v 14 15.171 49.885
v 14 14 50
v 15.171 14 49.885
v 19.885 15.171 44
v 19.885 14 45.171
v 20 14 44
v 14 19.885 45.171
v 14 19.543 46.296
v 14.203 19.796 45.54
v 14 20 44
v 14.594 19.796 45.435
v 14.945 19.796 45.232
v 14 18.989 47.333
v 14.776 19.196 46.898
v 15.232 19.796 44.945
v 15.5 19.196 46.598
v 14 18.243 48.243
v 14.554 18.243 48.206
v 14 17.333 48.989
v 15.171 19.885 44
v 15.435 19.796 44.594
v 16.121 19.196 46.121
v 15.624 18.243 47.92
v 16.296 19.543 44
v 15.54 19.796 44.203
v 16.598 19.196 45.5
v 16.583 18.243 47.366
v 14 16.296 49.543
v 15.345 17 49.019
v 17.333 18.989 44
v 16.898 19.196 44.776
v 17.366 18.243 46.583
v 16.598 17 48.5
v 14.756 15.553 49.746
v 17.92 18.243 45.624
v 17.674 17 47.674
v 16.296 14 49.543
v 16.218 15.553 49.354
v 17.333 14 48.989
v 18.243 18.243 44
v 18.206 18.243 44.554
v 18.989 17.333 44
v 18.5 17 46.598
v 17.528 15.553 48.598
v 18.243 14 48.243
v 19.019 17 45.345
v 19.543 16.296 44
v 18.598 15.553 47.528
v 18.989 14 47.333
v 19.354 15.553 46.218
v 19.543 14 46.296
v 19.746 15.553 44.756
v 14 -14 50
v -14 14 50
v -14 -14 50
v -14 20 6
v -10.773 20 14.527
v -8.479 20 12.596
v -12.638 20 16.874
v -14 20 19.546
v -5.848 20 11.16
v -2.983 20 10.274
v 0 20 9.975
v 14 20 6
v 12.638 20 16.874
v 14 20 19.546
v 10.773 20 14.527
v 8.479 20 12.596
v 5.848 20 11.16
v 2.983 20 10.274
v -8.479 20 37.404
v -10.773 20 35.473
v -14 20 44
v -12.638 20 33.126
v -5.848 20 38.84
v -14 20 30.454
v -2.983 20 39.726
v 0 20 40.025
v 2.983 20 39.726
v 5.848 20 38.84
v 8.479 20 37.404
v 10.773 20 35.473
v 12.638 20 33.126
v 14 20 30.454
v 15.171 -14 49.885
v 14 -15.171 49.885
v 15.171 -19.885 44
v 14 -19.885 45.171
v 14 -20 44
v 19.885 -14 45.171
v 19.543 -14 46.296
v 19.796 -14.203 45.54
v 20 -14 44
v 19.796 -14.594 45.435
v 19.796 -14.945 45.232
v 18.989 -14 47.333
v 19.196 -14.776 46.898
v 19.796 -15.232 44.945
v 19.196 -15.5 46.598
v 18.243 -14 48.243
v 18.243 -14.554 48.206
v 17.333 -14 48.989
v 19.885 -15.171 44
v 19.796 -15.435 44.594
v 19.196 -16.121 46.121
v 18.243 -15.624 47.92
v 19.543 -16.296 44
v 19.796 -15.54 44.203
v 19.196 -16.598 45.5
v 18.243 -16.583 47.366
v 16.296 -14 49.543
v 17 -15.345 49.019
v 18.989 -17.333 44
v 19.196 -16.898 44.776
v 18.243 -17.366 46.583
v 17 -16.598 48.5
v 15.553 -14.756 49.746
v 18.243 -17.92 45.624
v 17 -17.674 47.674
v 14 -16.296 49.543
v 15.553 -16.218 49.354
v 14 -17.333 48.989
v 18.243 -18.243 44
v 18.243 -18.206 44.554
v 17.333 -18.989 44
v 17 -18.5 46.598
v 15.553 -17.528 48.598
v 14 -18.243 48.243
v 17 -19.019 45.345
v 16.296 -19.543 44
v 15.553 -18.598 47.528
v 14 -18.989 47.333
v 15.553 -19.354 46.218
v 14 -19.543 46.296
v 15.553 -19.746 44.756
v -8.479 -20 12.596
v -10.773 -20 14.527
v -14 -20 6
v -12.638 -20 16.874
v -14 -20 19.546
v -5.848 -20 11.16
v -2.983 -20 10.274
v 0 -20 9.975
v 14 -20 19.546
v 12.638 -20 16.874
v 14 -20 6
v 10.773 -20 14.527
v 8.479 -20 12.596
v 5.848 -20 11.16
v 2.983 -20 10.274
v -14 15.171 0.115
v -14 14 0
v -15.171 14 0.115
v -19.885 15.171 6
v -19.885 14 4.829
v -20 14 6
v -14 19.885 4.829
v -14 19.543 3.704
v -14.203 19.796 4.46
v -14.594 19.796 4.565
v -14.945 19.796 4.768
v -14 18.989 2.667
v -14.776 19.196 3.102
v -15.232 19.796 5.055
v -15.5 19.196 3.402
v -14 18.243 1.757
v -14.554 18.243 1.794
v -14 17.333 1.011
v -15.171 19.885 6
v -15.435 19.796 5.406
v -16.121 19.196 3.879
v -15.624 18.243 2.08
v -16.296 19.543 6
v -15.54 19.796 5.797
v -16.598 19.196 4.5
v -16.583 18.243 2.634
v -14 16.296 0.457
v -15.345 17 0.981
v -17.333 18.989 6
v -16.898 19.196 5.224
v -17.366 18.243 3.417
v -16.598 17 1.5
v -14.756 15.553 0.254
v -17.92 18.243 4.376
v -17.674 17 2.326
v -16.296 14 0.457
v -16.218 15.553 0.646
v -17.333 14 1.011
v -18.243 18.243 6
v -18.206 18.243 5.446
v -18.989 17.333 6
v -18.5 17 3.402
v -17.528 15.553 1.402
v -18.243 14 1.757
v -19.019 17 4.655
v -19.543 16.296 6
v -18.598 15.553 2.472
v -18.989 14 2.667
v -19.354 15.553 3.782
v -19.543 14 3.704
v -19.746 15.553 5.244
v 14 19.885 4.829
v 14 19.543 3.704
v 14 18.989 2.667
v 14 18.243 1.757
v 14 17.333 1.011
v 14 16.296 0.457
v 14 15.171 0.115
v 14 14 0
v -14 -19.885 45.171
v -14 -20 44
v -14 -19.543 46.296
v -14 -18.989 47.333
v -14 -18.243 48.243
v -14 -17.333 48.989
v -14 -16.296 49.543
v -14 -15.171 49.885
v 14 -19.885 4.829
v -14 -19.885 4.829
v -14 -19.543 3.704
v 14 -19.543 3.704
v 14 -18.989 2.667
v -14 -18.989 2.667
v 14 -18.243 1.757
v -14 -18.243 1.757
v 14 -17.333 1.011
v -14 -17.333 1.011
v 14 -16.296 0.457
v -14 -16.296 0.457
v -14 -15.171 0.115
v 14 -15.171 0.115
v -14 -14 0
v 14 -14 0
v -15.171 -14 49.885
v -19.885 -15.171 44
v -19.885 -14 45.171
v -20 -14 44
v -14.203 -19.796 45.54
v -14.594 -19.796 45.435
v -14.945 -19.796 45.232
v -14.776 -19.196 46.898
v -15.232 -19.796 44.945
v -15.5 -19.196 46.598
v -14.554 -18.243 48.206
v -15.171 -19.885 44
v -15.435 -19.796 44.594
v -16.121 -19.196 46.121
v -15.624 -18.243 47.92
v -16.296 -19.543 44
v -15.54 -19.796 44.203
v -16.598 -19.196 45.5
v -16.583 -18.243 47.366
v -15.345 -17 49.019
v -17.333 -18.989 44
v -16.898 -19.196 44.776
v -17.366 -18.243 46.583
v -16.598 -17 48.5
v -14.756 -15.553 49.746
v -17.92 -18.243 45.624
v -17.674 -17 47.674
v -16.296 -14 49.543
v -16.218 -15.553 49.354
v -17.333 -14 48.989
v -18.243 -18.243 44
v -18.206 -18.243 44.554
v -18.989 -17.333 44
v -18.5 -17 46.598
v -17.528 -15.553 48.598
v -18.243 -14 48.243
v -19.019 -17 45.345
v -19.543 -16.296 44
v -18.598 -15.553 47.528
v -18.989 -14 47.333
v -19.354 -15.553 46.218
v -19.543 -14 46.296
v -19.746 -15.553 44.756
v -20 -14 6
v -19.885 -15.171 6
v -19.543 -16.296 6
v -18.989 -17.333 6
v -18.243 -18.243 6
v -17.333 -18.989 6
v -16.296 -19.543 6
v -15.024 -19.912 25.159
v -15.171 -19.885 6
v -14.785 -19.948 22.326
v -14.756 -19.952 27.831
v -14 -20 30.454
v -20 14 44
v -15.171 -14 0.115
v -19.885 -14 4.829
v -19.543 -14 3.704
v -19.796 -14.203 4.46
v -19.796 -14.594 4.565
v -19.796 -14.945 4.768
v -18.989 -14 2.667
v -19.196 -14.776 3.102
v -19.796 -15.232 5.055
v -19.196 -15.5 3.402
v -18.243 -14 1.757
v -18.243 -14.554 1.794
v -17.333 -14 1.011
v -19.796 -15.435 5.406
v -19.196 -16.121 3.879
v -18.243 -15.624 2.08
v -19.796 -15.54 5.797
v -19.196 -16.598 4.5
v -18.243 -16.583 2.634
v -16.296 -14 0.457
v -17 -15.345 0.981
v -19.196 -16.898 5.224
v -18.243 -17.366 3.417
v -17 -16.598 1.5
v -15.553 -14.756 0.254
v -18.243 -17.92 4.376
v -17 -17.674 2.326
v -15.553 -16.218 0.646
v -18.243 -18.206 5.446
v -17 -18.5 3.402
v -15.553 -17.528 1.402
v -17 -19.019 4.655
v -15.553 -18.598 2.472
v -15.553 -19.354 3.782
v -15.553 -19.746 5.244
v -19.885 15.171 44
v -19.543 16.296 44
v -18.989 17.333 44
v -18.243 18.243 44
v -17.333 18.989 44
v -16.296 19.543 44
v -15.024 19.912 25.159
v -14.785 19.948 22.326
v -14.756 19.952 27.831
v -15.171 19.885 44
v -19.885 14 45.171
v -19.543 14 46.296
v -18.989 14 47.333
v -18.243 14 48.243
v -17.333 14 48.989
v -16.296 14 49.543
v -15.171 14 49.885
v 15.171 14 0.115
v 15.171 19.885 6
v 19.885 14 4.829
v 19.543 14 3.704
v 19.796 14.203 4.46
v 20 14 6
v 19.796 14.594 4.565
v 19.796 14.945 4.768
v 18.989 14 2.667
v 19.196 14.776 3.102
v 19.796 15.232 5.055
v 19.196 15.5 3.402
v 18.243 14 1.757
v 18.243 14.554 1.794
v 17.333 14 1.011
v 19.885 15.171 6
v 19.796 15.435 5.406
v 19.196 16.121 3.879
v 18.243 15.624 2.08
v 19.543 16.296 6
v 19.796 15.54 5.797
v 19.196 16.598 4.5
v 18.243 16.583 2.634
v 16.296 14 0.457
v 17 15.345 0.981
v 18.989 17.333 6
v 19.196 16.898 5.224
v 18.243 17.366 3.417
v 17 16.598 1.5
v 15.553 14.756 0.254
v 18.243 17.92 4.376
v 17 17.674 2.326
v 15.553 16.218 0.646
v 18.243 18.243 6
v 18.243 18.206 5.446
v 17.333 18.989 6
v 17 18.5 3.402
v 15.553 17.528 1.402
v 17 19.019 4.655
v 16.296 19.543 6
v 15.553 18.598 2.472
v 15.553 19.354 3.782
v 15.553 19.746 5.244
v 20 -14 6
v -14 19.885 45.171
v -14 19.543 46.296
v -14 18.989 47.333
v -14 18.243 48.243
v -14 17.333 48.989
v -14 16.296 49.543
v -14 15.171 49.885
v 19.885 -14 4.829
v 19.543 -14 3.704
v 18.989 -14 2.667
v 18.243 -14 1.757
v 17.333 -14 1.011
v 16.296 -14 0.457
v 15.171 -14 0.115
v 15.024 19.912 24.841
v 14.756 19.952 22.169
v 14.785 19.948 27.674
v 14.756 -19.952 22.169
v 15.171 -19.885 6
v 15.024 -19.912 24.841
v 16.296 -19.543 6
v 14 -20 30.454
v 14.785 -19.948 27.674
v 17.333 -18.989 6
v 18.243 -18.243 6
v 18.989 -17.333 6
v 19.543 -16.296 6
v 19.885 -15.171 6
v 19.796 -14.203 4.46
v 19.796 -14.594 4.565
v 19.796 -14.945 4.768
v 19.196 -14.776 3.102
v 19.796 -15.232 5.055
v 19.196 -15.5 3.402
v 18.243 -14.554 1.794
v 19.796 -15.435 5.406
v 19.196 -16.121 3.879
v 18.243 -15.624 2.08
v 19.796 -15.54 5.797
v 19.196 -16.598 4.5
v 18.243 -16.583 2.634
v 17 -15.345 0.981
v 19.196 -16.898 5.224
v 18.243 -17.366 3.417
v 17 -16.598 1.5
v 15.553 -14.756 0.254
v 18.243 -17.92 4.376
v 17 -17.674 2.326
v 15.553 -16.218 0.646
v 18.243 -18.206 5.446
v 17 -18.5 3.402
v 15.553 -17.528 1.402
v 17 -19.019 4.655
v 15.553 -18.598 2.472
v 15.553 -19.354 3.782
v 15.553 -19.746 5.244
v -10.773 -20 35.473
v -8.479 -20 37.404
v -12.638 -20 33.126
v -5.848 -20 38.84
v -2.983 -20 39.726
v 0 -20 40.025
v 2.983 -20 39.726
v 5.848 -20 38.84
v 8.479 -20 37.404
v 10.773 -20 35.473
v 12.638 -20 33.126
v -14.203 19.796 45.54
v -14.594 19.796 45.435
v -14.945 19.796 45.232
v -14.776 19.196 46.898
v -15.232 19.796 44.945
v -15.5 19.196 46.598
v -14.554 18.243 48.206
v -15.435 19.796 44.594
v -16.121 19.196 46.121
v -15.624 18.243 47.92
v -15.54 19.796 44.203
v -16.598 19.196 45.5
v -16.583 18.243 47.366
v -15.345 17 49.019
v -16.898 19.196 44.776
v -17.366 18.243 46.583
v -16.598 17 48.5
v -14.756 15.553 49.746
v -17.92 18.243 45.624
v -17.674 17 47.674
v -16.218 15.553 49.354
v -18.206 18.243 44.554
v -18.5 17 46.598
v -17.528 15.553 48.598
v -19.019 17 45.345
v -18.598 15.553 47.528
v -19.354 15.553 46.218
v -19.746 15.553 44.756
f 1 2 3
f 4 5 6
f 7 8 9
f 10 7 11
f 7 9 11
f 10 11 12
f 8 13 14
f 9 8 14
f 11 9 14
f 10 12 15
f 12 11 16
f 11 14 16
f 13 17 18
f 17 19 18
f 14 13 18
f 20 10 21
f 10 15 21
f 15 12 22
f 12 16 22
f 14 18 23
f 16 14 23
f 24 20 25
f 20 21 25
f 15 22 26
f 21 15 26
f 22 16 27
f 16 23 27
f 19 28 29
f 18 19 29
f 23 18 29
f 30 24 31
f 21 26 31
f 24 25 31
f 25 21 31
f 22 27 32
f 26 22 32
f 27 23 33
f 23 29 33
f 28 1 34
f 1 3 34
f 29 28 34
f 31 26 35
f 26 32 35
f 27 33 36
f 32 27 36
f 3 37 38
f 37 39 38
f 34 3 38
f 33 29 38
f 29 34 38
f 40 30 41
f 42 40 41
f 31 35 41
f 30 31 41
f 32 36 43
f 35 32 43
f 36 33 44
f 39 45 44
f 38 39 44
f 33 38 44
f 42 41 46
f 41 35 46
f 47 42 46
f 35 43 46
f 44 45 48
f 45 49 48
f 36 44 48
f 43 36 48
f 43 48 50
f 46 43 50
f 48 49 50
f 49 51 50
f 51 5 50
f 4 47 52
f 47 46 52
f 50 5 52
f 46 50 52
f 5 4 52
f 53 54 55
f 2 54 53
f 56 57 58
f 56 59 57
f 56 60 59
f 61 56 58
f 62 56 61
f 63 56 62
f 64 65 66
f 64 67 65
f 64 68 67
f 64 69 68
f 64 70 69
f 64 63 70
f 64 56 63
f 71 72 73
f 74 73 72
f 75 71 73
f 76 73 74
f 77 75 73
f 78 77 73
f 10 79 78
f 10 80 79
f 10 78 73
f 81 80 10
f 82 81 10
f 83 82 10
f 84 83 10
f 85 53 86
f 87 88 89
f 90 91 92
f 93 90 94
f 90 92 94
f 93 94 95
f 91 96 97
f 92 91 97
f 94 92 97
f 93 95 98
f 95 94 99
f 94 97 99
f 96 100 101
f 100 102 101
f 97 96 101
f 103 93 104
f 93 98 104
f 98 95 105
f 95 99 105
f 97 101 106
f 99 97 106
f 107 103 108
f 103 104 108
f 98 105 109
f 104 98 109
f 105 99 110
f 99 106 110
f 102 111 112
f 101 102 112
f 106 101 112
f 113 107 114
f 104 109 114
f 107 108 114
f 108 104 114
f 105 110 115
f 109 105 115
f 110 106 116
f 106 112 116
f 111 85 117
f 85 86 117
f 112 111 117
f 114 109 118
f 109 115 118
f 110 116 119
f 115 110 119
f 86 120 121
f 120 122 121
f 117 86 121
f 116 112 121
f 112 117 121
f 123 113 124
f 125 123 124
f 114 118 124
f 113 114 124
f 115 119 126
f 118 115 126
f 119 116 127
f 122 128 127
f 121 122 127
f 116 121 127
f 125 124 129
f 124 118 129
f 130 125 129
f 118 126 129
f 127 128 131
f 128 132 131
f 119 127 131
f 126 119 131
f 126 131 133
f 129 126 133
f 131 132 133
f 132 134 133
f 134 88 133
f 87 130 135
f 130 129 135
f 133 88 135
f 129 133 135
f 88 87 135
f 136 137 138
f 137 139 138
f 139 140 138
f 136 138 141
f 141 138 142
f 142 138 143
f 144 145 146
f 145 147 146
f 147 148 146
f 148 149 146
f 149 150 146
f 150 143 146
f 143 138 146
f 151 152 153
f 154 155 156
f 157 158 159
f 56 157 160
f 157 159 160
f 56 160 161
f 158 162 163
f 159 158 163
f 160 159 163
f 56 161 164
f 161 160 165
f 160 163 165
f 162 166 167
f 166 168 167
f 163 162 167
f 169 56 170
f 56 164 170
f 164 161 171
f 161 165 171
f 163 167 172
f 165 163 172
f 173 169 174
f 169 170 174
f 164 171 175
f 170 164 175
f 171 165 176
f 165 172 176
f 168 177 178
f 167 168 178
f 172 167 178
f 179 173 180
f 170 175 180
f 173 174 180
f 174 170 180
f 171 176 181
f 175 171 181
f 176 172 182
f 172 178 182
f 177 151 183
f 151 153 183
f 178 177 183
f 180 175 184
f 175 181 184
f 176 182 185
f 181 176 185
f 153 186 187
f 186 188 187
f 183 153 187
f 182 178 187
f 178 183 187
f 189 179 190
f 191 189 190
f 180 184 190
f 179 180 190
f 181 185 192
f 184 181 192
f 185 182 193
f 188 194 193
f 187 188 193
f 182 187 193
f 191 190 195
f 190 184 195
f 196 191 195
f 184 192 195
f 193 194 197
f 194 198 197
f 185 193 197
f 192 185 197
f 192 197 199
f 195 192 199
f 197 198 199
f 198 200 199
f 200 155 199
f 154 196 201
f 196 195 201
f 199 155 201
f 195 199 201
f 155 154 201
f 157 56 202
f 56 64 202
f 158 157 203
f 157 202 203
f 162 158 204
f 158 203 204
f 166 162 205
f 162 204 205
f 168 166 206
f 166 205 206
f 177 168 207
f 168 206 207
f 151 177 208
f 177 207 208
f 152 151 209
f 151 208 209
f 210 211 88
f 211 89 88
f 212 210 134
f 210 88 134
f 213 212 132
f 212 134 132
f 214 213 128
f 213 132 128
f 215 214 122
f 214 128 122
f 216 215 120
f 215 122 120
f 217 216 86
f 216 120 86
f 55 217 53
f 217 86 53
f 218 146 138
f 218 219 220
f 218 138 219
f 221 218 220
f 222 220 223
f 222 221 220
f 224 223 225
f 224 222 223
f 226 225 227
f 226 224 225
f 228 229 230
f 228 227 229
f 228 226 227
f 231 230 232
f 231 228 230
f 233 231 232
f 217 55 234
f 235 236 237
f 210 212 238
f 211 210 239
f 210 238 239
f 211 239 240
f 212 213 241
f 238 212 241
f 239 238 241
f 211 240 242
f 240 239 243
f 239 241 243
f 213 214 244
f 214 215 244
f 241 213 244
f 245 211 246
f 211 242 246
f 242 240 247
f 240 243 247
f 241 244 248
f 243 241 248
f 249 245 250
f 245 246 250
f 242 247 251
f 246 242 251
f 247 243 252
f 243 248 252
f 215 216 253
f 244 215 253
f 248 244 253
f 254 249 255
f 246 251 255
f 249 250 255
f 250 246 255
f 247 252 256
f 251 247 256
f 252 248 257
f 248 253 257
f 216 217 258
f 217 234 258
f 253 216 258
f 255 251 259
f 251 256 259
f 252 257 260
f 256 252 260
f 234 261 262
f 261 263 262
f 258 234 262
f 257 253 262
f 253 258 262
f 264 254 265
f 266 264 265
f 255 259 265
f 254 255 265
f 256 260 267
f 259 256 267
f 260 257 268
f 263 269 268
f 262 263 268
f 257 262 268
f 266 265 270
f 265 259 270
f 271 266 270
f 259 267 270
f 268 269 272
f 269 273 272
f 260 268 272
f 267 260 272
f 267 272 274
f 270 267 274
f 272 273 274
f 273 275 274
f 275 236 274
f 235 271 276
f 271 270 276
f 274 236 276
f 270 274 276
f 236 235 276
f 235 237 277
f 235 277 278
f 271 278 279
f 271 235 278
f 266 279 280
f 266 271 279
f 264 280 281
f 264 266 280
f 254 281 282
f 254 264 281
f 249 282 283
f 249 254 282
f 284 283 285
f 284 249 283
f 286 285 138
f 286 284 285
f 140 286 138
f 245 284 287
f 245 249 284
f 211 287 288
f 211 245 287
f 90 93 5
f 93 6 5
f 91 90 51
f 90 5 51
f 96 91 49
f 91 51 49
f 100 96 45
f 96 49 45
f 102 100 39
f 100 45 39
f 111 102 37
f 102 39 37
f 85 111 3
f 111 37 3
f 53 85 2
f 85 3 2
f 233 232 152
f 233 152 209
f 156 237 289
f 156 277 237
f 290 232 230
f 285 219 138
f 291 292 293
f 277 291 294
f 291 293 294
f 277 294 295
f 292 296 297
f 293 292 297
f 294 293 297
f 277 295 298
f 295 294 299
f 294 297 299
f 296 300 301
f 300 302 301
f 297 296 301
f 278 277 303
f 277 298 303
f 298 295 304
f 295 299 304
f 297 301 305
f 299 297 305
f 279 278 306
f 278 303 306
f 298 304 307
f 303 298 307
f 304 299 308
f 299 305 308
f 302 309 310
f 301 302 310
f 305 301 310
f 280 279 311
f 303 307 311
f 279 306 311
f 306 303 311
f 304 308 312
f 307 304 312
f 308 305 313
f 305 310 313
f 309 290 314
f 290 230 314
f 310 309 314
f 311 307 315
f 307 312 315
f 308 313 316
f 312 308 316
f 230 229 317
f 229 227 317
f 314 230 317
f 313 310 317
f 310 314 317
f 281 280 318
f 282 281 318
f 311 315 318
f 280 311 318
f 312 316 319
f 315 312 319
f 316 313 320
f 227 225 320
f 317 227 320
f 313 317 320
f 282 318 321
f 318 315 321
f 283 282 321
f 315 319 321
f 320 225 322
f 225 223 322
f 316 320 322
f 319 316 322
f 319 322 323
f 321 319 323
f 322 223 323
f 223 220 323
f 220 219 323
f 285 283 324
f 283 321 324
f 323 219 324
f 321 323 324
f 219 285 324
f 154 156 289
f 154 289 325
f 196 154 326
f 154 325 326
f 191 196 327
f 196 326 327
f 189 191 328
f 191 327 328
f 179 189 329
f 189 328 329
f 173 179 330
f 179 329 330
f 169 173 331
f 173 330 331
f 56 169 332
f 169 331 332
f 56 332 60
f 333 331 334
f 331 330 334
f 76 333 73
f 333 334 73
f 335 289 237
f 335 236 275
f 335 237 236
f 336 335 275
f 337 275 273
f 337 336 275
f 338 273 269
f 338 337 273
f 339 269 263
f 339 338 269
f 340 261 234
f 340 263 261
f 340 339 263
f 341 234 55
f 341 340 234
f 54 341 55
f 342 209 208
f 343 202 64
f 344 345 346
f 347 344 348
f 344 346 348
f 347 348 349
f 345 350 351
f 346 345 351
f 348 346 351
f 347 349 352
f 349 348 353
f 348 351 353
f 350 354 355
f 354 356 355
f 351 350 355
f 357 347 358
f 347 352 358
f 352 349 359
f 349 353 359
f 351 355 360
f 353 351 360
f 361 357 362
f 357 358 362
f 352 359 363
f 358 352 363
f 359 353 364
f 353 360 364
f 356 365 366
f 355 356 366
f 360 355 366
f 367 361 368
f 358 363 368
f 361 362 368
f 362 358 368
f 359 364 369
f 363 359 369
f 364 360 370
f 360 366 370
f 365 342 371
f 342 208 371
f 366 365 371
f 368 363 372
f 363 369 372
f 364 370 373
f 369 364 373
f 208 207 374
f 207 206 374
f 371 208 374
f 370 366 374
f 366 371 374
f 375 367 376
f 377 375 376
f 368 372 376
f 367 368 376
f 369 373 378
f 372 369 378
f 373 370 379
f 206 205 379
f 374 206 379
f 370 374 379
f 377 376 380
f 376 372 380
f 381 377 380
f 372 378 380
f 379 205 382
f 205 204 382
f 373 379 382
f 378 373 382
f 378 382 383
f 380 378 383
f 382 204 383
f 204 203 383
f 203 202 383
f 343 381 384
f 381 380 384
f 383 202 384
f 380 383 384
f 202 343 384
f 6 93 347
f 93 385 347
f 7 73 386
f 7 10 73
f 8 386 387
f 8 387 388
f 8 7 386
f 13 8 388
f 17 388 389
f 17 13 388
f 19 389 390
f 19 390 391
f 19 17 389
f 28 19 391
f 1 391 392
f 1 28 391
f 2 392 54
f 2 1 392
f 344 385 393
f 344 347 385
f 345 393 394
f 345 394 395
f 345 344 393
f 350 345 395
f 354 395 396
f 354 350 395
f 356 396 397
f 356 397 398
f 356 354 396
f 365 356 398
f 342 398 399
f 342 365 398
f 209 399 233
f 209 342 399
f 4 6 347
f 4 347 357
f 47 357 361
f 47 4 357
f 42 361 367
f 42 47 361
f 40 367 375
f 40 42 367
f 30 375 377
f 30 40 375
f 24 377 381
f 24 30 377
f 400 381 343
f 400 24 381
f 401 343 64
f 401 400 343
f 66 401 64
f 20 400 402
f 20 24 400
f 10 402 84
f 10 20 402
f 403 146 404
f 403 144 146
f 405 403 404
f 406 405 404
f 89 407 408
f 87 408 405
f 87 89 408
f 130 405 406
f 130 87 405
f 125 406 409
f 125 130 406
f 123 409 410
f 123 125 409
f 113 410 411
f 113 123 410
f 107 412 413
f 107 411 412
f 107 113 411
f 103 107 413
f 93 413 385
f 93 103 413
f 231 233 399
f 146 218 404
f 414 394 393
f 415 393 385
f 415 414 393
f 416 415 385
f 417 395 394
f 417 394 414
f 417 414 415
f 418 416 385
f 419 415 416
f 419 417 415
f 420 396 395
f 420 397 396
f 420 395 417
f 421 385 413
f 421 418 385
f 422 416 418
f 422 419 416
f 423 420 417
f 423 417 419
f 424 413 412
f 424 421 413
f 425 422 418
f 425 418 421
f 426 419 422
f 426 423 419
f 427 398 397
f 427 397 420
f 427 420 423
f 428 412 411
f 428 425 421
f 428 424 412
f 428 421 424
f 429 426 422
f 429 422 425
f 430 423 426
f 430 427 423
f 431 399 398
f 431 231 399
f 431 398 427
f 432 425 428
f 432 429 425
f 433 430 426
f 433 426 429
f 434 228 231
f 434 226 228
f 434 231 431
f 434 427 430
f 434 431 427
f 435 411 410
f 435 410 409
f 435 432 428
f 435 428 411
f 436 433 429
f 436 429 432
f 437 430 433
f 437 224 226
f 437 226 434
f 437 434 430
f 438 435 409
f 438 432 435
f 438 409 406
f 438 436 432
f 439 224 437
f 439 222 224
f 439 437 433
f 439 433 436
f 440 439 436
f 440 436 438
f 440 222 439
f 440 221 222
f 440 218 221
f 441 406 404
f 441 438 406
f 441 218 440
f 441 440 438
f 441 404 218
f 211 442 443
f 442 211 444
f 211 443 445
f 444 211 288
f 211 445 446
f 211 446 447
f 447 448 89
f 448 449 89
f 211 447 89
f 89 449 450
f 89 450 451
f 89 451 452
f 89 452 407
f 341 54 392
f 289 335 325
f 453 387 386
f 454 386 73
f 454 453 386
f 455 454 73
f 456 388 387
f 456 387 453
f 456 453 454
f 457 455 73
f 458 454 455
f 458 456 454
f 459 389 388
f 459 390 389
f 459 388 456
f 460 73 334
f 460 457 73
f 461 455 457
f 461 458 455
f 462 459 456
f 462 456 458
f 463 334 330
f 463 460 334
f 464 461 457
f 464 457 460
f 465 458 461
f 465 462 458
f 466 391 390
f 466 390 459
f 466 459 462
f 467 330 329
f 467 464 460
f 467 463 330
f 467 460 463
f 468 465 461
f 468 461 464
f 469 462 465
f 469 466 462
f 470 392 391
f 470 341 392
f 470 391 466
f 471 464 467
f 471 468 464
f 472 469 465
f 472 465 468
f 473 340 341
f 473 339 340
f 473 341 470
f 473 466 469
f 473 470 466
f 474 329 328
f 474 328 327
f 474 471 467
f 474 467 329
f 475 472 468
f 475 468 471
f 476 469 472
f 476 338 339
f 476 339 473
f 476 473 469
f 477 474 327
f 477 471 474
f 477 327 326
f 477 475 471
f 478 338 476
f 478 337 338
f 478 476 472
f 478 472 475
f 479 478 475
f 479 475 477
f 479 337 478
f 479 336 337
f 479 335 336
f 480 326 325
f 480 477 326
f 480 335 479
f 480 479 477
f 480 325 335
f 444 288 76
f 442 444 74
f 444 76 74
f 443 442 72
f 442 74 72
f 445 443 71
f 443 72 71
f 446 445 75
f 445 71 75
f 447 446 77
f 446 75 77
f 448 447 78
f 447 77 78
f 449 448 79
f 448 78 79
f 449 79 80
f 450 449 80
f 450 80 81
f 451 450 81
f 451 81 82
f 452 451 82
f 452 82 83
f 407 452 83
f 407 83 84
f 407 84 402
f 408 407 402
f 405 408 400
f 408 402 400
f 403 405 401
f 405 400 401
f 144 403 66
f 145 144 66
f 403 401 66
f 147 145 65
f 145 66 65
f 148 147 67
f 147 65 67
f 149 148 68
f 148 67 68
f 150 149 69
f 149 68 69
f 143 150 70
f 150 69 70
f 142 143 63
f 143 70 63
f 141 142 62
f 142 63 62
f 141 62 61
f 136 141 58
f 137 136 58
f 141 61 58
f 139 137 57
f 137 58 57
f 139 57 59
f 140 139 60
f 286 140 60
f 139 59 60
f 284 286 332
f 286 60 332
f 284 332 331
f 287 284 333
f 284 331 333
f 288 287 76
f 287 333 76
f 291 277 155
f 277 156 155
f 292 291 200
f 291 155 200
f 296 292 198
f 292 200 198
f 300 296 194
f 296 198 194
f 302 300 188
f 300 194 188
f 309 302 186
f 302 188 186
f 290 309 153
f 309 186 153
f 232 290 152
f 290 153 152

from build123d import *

# Parameters (mm, degrees)
SKETCH1_W           = 40
SKETCH1_H           = 40
BOSS_EXTRUDE1_DEPTH = 50
FILLET1_R           = 6
SKETCH2_R           = 15.025
CUT_EXTRUDE1_DEPTH  = 50


with BuildPart() as part:
    # Sketch1 → Boss-Extrude1 (new body)
    with BuildSketch(Plane.XY):
        Rectangle(SKETCH1_W, SKETCH1_H)
    extrude(amount=BOSS_EXTRUDE1_DEPTH)

    # Fillet1
    fillet1_edges = [part.edges().sort_by_distance(p)[0] for p in [
        (-20, 0, 50),
        (0, -20, 50),
        (20, 0, 50),
        (0, -20, 0),
        (-20, 0, 0),
        (0, 20, 0),
        (20, 0, 0),
        (0, 20, 50),
        (20, -20, 25),
        (-20, -20, 25),
        (-20, 20, 25),
        (20, 20, 25),
    ]]
    fillet(fillet1_edges, radius=FILLET1_R)

    # Sketch2 → Cut-Extrude1 (cut)
    with BuildSketch(Plane(origin=(0, 20, 0), x_dir=(1, 0, 0), z_dir=(0, 1, 0))):
        with Locations(Location((0, -25, 0), (0, 0, 201.285935721))):
            Circle(SKETCH2_R)
    extrude(amount=-CUT_EXTRUDE1_DEPTH, mode=Mode.SUBTRACT)


solid = part.part
